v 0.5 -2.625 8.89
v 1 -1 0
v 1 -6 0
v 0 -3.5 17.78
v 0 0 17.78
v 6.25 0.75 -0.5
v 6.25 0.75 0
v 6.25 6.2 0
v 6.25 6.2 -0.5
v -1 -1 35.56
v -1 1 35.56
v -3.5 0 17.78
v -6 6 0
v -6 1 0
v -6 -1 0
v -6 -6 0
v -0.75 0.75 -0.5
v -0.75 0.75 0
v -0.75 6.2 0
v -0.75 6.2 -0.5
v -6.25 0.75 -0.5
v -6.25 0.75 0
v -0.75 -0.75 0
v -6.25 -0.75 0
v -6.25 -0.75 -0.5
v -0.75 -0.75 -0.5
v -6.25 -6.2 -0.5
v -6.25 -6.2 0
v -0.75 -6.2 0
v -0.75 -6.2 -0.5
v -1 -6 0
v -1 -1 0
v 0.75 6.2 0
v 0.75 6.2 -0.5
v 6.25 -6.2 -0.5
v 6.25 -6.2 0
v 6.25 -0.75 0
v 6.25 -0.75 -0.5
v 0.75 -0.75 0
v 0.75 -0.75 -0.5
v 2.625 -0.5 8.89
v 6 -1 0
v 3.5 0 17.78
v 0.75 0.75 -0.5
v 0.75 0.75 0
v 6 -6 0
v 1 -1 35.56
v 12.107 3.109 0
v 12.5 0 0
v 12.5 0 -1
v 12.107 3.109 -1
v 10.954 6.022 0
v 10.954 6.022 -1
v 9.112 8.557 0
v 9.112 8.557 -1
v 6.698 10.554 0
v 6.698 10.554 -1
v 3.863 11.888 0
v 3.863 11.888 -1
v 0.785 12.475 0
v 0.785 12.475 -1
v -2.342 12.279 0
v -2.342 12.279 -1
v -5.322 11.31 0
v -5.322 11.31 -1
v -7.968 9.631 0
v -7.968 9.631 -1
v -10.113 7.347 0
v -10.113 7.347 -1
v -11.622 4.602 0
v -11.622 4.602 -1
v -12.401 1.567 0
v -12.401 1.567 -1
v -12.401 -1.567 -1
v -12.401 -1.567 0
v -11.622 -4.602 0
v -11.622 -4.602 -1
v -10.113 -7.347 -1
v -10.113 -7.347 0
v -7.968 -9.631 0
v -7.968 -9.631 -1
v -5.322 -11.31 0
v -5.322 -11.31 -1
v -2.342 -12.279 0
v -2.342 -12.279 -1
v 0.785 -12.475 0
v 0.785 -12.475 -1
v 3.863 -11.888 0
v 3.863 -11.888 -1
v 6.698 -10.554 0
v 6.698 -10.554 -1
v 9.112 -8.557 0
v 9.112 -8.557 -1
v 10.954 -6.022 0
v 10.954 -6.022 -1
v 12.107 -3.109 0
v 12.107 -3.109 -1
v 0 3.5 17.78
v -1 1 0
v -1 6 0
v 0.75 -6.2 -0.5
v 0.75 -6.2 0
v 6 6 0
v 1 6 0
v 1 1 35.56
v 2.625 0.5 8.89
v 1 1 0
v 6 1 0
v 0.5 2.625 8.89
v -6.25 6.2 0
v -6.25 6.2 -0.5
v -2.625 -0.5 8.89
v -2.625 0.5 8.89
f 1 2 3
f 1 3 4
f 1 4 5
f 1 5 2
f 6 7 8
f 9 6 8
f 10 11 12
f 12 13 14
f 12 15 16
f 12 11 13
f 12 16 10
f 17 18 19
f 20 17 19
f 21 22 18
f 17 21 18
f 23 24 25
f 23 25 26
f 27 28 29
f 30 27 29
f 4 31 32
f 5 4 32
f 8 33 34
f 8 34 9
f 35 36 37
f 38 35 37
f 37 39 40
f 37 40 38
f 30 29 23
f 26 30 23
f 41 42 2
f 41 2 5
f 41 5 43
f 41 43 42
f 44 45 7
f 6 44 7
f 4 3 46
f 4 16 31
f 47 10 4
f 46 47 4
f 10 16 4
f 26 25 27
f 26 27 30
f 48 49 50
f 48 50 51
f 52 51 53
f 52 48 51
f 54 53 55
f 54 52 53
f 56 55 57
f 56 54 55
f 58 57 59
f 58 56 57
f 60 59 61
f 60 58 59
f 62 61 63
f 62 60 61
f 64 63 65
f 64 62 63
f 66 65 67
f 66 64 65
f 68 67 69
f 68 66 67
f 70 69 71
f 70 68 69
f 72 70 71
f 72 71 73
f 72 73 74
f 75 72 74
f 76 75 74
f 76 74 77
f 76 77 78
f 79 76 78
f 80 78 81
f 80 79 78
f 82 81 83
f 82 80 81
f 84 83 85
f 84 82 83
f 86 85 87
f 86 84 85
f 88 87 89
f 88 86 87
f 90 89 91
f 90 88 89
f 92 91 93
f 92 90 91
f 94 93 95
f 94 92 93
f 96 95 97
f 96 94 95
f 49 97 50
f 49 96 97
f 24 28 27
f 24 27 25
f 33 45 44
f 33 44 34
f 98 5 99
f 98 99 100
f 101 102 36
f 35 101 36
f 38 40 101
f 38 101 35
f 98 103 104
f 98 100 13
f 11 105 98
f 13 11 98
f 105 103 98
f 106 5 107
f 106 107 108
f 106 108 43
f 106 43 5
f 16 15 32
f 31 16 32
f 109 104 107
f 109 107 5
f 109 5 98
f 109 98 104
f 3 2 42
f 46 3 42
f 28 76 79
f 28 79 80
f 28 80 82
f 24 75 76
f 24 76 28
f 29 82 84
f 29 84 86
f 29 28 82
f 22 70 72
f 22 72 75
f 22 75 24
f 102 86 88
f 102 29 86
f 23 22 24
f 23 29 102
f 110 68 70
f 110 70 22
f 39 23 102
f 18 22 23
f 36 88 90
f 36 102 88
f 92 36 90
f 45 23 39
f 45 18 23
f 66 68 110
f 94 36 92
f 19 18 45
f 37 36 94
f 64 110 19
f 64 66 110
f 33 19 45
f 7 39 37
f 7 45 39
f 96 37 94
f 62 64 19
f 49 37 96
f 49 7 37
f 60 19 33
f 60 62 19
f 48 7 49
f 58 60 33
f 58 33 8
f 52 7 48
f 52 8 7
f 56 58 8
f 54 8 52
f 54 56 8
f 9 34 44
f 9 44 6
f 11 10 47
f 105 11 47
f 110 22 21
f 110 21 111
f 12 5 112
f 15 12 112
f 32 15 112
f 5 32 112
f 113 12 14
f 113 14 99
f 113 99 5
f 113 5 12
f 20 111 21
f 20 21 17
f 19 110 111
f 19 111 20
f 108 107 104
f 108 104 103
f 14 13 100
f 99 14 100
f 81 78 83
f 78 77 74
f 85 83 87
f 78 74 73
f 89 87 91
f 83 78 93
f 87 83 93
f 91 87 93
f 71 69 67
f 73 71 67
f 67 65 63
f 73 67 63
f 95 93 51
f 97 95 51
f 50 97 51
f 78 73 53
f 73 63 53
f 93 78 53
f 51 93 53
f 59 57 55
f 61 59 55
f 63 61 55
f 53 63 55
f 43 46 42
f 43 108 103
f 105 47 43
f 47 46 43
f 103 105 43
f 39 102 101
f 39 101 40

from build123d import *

# Parameters (mm, degrees)
F0_W      = 5
F0_H      = 5
F2_W      = 2
F2_H      = 2
F4_R      = 12.5
F5_DEPTH  = 1
F6_W      = 5.5
F6_H      = 5.45
F7_DEPTH  = 0.5
F3_FACE_W = 2
F3_FACE_H = 2


with BuildPart() as f3:
    # F0 (on Top) → F3 section 0
    with BuildSketch(Plane.XY):
        with Locations((-3.5, 3.5)):
            Rectangle(F0_W, F0_H)
    # F2 (on offset) → F3 section 1
    with BuildSketch(Plane.XY.offset(35.56)):
        Rectangle(F2_W, F2_H)
    loft()

    # F2 (on offset) → F8 section 0
    with BuildSketch(Plane.XY.offset(35.56)):
        Rectangle(F2_W, F2_H)
    # F0 (on Top) → F8 section 1
    with BuildSketch(Plane.XY):
        with Locations((-3.5, -3.5)):
            Rectangle(F0_W, F0_H)
    loft()

    # F0 (on Top) → F9 section 0
    with BuildSketch(Plane.XY):
        with Locations((3.5, 3.5)):
            Rectangle(F0_W, F0_H)
    # F3_face (on face) → F9 section 1
    with BuildSketch(Plane.XY.offset(35.56)):
        Rectangle(F3_FACE_W, F3_FACE_H)
    loft()

    # F0 (on Top) → F10 section 0
    with BuildSketch(Plane.XY):
        with Locations((3.5, -3.5)):
            Rectangle(F0_W, F0_H)
    # F3_face (on face) → F10 section 1
    with BuildSketch(Plane.XY.offset(35.56)):
        Rectangle(F3_FACE_W, F3_FACE_H)
    loft()


with BuildPart() as f5:
    # F4 (on Top) → F5 (new body)
    with BuildSketch(Plane.XY):
        Circle(F4_R)
    extrude(amount=-F5_DEPTH)

    # F6 (on face) → F7 (cut)
    with BuildSketch(Plane.XY):
        with Locations((-3.5, 3.475)):
            Rectangle(F6_W, F6_H)
        with Locations((3.5, 3.475)):
            Rectangle(F6_W, F6_H)
        with Locations((-3.5, -3.475)):
            Rectangle(F6_W, F6_H)
        with Locations((3.5, -3.475)):
            Rectangle(F6_W, F6_H)
    extrude(amount=-F7_DEPTH, mode=Mode.SUBTRACT)


solid = Compound([f3.part, f5.part])
